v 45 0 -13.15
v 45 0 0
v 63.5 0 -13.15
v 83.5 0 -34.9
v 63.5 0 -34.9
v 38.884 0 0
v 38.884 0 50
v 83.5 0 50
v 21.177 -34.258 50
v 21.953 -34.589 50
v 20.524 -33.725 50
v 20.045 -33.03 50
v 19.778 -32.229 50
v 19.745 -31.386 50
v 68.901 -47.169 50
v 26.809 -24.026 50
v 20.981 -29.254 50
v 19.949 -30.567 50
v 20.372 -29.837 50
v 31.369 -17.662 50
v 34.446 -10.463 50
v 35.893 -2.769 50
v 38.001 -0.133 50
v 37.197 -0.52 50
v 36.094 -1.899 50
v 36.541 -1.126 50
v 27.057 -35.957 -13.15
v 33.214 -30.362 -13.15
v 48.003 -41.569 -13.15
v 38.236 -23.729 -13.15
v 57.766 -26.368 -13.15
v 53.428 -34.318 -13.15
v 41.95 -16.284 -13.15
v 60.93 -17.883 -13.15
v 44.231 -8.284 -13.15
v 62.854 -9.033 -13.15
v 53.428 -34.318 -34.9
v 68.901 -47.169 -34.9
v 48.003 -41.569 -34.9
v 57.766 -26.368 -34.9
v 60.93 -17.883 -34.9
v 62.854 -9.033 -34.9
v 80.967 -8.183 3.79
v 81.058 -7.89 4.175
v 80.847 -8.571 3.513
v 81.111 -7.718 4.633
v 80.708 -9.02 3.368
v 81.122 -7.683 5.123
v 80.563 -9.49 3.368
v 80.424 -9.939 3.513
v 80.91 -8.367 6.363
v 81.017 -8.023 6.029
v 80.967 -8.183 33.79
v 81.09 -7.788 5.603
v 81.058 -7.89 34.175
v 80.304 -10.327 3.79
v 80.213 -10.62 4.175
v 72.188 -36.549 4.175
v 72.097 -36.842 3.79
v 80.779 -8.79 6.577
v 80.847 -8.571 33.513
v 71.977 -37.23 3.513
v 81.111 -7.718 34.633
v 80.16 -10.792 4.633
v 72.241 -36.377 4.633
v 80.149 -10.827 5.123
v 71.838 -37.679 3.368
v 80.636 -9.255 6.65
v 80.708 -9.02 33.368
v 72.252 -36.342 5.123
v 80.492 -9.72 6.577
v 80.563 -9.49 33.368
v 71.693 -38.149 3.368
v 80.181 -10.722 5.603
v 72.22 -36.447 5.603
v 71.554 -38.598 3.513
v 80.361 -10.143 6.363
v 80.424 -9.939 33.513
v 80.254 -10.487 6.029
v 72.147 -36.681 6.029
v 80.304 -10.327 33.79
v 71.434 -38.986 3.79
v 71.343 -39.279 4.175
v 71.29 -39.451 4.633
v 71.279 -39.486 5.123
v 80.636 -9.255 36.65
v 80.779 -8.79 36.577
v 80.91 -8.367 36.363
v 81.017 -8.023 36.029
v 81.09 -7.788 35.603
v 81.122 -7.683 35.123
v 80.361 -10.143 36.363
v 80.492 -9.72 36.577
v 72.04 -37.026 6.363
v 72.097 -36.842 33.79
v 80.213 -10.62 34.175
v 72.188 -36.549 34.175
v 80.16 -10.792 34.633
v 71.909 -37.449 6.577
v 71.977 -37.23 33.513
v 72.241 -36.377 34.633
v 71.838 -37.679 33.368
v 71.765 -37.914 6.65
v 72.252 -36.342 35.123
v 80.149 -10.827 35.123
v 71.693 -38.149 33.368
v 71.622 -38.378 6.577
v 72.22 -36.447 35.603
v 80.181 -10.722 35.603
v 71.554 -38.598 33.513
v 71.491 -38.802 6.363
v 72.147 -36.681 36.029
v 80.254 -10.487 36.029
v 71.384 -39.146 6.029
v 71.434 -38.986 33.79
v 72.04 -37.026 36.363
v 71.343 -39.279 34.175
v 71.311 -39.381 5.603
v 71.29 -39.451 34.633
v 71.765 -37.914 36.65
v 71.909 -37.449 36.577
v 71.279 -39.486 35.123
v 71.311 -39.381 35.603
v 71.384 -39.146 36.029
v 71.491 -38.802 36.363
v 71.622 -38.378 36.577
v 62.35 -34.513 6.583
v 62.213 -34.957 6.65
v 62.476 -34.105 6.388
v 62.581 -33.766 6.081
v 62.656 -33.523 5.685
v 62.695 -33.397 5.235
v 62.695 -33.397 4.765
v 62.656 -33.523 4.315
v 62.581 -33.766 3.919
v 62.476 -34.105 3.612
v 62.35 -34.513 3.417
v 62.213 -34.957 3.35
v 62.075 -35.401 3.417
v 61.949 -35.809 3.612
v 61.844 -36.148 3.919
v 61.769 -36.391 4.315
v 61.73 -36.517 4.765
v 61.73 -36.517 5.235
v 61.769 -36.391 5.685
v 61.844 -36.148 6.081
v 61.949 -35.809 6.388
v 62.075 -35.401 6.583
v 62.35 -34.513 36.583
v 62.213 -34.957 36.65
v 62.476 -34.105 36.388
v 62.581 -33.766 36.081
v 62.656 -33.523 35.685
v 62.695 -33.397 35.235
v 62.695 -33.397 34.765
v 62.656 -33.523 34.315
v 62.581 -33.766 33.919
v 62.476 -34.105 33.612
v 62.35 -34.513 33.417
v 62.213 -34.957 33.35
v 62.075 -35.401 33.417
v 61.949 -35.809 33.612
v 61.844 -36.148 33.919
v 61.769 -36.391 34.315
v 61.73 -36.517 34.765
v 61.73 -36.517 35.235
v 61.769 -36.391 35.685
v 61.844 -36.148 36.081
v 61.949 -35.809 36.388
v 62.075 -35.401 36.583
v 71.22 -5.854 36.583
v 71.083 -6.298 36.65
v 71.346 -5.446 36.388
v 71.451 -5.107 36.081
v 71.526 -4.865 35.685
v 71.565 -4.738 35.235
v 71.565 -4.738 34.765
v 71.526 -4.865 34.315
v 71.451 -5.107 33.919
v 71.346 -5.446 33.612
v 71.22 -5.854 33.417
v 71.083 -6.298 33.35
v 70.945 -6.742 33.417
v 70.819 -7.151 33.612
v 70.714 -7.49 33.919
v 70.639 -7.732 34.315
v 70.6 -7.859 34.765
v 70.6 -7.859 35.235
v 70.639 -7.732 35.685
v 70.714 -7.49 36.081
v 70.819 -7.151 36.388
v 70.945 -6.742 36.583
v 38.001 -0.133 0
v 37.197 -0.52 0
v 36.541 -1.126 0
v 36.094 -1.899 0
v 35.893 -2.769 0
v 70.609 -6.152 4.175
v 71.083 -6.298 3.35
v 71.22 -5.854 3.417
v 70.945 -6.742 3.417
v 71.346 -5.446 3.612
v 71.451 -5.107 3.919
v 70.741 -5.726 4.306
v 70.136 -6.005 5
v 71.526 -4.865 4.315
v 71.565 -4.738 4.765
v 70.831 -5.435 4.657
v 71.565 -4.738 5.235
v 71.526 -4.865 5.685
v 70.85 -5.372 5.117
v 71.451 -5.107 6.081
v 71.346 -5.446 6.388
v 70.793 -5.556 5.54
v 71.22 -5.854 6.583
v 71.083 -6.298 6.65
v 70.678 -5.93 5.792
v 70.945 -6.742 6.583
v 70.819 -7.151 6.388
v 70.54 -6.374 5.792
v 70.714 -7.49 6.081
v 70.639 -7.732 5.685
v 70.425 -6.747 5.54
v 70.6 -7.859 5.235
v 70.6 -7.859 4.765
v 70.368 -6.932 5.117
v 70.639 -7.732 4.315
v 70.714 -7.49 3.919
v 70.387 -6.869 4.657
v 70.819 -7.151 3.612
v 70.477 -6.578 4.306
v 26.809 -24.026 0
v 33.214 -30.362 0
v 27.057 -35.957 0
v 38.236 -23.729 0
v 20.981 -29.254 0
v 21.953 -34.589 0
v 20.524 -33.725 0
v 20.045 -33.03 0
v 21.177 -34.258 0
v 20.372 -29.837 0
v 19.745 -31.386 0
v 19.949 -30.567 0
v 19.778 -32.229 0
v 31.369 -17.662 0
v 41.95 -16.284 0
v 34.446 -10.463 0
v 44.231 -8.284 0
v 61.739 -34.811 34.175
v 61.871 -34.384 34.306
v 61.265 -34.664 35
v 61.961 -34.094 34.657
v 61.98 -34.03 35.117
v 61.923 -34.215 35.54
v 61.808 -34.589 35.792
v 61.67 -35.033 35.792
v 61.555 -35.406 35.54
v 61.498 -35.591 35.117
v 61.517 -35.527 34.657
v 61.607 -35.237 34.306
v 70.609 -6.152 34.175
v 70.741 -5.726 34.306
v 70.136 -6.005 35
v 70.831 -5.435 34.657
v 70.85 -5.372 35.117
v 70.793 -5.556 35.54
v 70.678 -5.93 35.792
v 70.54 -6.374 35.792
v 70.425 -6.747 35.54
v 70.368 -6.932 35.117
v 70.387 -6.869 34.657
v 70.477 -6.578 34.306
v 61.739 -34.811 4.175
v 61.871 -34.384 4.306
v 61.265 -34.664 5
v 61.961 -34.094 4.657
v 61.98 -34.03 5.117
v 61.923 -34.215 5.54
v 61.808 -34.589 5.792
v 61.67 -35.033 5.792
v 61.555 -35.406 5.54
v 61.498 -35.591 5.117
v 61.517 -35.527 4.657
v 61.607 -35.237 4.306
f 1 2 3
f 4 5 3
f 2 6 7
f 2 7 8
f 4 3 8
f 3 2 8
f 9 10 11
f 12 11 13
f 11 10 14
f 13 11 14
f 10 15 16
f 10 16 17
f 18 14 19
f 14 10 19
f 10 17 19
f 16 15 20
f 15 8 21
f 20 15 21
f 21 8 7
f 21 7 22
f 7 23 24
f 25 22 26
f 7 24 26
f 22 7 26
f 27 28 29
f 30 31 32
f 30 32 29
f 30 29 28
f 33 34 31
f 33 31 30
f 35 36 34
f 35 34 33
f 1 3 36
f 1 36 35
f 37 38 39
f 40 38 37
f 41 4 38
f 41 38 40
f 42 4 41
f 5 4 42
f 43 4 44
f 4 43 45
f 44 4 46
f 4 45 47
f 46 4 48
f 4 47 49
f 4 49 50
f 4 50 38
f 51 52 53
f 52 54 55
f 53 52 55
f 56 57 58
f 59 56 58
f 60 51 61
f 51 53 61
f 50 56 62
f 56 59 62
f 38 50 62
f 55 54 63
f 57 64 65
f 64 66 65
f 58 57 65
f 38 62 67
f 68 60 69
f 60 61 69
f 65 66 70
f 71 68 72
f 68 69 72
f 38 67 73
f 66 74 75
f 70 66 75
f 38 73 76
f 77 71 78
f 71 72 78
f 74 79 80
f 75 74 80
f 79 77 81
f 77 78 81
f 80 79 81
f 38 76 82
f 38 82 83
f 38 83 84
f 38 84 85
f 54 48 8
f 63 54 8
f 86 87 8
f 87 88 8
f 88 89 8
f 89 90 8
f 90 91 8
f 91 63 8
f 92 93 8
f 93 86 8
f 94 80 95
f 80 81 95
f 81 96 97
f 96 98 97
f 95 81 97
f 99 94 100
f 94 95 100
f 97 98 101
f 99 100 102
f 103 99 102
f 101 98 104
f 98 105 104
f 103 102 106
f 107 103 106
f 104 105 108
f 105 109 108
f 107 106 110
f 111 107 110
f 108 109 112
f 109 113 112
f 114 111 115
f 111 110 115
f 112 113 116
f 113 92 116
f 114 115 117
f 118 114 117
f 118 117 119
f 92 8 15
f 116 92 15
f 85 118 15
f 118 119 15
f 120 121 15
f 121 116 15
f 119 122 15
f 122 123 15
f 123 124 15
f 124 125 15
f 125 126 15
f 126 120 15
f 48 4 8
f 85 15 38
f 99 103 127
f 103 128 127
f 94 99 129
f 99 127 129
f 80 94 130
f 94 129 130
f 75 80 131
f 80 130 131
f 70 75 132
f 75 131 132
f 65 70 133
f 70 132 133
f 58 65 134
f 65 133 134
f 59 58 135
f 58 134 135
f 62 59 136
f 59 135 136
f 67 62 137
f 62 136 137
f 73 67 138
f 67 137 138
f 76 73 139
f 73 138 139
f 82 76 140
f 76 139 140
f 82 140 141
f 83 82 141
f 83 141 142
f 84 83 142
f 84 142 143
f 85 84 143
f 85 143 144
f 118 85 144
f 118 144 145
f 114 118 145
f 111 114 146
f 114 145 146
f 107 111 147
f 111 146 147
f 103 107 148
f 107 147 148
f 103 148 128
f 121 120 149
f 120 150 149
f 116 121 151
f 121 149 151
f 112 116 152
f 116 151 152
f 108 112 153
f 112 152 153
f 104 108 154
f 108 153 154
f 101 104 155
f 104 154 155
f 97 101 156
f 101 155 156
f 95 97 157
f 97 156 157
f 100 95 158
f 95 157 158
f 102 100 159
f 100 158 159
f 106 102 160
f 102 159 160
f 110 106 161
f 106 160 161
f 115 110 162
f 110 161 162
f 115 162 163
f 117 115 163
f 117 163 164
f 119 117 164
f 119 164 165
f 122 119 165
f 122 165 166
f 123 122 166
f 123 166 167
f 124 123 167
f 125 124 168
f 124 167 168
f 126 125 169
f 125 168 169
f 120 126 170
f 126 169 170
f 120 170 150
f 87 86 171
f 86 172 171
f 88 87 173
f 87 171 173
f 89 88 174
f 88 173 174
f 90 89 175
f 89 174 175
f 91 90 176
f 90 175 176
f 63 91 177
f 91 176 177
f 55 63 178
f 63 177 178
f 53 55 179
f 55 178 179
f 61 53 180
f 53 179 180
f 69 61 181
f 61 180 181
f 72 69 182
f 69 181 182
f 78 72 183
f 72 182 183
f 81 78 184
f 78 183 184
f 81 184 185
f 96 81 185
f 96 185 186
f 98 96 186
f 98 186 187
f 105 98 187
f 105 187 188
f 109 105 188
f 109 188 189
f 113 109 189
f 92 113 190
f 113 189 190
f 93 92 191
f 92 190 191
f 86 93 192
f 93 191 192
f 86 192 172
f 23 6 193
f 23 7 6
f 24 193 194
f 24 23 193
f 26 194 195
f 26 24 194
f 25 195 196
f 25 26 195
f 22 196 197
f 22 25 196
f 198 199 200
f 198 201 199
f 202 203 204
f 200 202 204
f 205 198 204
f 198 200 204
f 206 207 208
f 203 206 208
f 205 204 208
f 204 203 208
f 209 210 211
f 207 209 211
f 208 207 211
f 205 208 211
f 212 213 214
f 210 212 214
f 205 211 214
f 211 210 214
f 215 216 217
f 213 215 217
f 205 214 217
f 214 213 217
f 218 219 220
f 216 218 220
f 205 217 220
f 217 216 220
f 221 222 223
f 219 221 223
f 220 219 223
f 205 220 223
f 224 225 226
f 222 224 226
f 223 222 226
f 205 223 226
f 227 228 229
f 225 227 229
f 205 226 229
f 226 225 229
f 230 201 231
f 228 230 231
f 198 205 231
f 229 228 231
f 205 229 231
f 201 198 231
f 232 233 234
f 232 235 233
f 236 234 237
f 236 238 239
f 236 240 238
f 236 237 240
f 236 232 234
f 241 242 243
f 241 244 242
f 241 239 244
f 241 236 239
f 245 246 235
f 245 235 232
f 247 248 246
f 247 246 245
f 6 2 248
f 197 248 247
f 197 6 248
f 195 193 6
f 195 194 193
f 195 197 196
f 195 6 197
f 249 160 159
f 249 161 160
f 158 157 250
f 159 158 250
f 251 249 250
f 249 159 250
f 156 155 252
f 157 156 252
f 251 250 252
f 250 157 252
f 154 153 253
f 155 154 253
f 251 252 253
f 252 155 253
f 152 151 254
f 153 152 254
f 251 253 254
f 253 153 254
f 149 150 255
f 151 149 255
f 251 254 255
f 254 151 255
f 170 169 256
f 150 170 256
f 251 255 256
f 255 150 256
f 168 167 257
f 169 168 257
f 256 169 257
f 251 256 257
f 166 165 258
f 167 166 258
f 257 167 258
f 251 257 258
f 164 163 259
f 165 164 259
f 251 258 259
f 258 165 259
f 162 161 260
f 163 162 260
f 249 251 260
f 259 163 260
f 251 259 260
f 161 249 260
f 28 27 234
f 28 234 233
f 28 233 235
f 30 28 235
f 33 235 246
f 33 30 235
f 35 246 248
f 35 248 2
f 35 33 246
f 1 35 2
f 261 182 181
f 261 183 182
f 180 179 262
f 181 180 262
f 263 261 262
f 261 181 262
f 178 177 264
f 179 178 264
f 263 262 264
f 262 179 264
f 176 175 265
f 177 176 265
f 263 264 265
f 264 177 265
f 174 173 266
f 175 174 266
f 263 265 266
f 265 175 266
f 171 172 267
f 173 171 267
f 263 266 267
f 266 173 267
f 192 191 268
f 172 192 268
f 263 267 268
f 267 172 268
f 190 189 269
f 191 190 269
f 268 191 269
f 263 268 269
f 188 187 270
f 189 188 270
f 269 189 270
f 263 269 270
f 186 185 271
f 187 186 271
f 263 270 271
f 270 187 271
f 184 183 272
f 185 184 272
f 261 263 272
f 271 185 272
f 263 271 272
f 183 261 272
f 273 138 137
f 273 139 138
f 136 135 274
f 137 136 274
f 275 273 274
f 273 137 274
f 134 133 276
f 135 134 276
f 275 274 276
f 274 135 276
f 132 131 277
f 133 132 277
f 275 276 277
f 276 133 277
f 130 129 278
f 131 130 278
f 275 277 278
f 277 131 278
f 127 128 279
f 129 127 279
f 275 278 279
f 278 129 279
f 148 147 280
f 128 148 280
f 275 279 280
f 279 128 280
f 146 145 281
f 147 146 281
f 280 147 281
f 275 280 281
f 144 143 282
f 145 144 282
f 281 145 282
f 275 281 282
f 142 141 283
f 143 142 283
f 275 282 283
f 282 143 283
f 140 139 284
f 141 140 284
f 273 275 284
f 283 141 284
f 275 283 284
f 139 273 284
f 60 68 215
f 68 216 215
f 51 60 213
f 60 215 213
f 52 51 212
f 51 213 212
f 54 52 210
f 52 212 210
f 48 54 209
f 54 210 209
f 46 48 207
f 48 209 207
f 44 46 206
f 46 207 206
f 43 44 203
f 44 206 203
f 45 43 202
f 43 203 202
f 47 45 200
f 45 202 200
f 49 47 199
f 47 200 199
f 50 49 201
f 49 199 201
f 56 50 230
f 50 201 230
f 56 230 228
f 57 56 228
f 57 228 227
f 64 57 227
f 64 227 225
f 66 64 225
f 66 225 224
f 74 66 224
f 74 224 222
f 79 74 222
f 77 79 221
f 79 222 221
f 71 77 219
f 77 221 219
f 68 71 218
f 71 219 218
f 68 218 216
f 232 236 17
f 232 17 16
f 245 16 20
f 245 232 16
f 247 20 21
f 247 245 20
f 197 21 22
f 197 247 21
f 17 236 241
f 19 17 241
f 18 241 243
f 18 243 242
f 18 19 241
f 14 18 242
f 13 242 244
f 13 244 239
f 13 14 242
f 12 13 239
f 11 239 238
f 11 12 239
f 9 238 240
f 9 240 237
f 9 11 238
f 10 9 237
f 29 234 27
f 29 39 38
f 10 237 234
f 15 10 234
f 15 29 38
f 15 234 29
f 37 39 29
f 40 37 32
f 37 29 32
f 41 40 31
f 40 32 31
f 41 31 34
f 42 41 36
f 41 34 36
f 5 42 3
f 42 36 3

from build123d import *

# Parameters (mm, degrees)
BOSS_EXTRUDE1_DEPTH             = 50
BOSS_EXTRUDE2_START             = 13.15
BOSS_EXTRUDE2_DEPTH             = 13.15
BOSS_EXTRUDE3_DEPTH             = 21.75
BOSS_EXTRUDE3_DEPTH_BACK        = 63.15
CUT_EXTRUDE1_DEPTH              = 145.663436984
FILLET1_R                       = 3
CUT_EXTRUDE2_DEPTH              = 129.082637169
TAP_DRILL_FOR_M4X0_7_TAP1_D     = 3.3
TAP_DRILL_FOR_M4X0_7_TAP1_DEPTH = 10
TAP_DRILL_FOR_M4X0_7_TAP1_TIP   = 0.991420021


with BuildPart() as part:
    # Sketch1 → Boss-Extrude1 (new body)
    with BuildSketch(Plane.XY):
        with BuildLine():
            Line((36, 0), (63.5, 0))
            ThreePointArc((63.5, 0), (49.923691771, -39.241241061), (15, -61.702917273))
            Line((15, -61.702917273), (15, -32.726136344))
            ThreePointArc((15, -32.726136344), (30.298514815, -19.442222095), (36, 0))
        make_face()
    extrude(amount=BOSS_EXTRUDE1_DEPTH)

    # Sketch2 → Boss-Extrude2 (add)
    with BuildSketch(Plane(origin=(0, 0, 0), x_dir=(-1, 0, 0), z_dir=(0, 0, -1)).offset(BOSS_EXTRUDE2_START)):
        with BuildLine():
            Line((-45, 0), (-63.5, 0))
            ThreePointArc((-63.5, 0), (-49.923691771, -39.241241061), (-15, -61.702917273))
            Line((-15, -61.702917273), (-15, -42.426406871))
            ThreePointArc((-15, -42.426406871), (-36.742346142, -25.980762114), (-45, 0))
        make_face()
    extrude(amount=-BOSS_EXTRUDE2_DEPTH)

    # Sketch3 → Boss-Extrude3 (add, two sides: drawn at the far end of the back side and taken through both)
    with BuildSketch(Plane(origin=(0, 0, -13.15), x_dir=(-1, 0, 0), z_dir=(0, 0, -1)).offset(-BOSS_EXTRUDE3_DEPTH_BACK)):
        with BuildLine():
            Line((-63.5, 0), (-83.5, 0))
            ThreePointArc((-83.5, 0), (-64.127802083, -53.477799132), (-15, -82.141645954))
            Line((-15, -82.141645954), (-15, -61.702917273))
            ThreePointArc((-15, -61.702917273), (-49.923691771, -39.241241061), (-63.5, 0))
        make_face()
    extrude(amount=BOSS_EXTRUDE3_DEPTH + BOSS_EXTRUDE3_DEPTH_BACK)

    # Sketch4 → Cut-Extrude1 (cut, through all)
    with BuildSketch(Plane.XY.offset(50)):
        with BuildLine():
            Line((15, -32.726136344), (68.901001848, -47.16886626))
            ThreePointArc((68.901001848, -47.16886626), (45.449074332, -70.047352857), (15, -82.141645954))
            Line((15, -82.141645954), (15, -32.726136344))
        make_face()
    extrude(amount=-CUT_EXTRUDE1_DEPTH, mode=Mode.SUBTRACT)

    # Fillet1
    fillet1_edges = [part.edges().sort_by_distance(p)[0] for p in [
        (36, 0, 25),
        (15, -32.726136344, 25),
    ]]
    fillet(fillet1_edges, radius=FILLET1_R)

    # Sketch5 → Cut-Extrude2 (cut, through all)
    with BuildSketch(Plane.XY.offset(50)):
        with BuildLine():
            Line((83.5, 0), (68.901001848, -47.16886626))
            ThreePointArc((68.901001848, -47.16886626), (79.766796521, -24.688219313), (83.5, 0))
        make_face()
    extrude(amount=-CUT_EXTRUDE2_DEPTH, mode=Mode.SUBTRACT)

    # Tap Drill for M4x0.7 Tap1
    with Locations(Plane(origin=(76.200500924, -23.58443313, 0), x_dir=(0, 0, -1), z_dir=(0.9552909762953877, -0.29566729715781054, 0))):
        with Locations((-35, 15), (-35, -15), (-5, 15), (-5, -15)):
            Hole(TAP_DRILL_FOR_M4X0_7_TAP1_D / 2, depth=TAP_DRILL_FOR_M4X0_7_TAP1_DEPTH)
            with Locations((0, 0, -(TAP_DRILL_FOR_M4X0_7_TAP1_DEPTH + TAP_DRILL_FOR_M4X0_7_TAP1_TIP / 2))):  # 118° drill point
                Cone(0, TAP_DRILL_FOR_M4X0_7_TAP1_D / 2, TAP_DRILL_FOR_M4X0_7_TAP1_TIP, mode=Mode.SUBTRACT)


solid = part.part
